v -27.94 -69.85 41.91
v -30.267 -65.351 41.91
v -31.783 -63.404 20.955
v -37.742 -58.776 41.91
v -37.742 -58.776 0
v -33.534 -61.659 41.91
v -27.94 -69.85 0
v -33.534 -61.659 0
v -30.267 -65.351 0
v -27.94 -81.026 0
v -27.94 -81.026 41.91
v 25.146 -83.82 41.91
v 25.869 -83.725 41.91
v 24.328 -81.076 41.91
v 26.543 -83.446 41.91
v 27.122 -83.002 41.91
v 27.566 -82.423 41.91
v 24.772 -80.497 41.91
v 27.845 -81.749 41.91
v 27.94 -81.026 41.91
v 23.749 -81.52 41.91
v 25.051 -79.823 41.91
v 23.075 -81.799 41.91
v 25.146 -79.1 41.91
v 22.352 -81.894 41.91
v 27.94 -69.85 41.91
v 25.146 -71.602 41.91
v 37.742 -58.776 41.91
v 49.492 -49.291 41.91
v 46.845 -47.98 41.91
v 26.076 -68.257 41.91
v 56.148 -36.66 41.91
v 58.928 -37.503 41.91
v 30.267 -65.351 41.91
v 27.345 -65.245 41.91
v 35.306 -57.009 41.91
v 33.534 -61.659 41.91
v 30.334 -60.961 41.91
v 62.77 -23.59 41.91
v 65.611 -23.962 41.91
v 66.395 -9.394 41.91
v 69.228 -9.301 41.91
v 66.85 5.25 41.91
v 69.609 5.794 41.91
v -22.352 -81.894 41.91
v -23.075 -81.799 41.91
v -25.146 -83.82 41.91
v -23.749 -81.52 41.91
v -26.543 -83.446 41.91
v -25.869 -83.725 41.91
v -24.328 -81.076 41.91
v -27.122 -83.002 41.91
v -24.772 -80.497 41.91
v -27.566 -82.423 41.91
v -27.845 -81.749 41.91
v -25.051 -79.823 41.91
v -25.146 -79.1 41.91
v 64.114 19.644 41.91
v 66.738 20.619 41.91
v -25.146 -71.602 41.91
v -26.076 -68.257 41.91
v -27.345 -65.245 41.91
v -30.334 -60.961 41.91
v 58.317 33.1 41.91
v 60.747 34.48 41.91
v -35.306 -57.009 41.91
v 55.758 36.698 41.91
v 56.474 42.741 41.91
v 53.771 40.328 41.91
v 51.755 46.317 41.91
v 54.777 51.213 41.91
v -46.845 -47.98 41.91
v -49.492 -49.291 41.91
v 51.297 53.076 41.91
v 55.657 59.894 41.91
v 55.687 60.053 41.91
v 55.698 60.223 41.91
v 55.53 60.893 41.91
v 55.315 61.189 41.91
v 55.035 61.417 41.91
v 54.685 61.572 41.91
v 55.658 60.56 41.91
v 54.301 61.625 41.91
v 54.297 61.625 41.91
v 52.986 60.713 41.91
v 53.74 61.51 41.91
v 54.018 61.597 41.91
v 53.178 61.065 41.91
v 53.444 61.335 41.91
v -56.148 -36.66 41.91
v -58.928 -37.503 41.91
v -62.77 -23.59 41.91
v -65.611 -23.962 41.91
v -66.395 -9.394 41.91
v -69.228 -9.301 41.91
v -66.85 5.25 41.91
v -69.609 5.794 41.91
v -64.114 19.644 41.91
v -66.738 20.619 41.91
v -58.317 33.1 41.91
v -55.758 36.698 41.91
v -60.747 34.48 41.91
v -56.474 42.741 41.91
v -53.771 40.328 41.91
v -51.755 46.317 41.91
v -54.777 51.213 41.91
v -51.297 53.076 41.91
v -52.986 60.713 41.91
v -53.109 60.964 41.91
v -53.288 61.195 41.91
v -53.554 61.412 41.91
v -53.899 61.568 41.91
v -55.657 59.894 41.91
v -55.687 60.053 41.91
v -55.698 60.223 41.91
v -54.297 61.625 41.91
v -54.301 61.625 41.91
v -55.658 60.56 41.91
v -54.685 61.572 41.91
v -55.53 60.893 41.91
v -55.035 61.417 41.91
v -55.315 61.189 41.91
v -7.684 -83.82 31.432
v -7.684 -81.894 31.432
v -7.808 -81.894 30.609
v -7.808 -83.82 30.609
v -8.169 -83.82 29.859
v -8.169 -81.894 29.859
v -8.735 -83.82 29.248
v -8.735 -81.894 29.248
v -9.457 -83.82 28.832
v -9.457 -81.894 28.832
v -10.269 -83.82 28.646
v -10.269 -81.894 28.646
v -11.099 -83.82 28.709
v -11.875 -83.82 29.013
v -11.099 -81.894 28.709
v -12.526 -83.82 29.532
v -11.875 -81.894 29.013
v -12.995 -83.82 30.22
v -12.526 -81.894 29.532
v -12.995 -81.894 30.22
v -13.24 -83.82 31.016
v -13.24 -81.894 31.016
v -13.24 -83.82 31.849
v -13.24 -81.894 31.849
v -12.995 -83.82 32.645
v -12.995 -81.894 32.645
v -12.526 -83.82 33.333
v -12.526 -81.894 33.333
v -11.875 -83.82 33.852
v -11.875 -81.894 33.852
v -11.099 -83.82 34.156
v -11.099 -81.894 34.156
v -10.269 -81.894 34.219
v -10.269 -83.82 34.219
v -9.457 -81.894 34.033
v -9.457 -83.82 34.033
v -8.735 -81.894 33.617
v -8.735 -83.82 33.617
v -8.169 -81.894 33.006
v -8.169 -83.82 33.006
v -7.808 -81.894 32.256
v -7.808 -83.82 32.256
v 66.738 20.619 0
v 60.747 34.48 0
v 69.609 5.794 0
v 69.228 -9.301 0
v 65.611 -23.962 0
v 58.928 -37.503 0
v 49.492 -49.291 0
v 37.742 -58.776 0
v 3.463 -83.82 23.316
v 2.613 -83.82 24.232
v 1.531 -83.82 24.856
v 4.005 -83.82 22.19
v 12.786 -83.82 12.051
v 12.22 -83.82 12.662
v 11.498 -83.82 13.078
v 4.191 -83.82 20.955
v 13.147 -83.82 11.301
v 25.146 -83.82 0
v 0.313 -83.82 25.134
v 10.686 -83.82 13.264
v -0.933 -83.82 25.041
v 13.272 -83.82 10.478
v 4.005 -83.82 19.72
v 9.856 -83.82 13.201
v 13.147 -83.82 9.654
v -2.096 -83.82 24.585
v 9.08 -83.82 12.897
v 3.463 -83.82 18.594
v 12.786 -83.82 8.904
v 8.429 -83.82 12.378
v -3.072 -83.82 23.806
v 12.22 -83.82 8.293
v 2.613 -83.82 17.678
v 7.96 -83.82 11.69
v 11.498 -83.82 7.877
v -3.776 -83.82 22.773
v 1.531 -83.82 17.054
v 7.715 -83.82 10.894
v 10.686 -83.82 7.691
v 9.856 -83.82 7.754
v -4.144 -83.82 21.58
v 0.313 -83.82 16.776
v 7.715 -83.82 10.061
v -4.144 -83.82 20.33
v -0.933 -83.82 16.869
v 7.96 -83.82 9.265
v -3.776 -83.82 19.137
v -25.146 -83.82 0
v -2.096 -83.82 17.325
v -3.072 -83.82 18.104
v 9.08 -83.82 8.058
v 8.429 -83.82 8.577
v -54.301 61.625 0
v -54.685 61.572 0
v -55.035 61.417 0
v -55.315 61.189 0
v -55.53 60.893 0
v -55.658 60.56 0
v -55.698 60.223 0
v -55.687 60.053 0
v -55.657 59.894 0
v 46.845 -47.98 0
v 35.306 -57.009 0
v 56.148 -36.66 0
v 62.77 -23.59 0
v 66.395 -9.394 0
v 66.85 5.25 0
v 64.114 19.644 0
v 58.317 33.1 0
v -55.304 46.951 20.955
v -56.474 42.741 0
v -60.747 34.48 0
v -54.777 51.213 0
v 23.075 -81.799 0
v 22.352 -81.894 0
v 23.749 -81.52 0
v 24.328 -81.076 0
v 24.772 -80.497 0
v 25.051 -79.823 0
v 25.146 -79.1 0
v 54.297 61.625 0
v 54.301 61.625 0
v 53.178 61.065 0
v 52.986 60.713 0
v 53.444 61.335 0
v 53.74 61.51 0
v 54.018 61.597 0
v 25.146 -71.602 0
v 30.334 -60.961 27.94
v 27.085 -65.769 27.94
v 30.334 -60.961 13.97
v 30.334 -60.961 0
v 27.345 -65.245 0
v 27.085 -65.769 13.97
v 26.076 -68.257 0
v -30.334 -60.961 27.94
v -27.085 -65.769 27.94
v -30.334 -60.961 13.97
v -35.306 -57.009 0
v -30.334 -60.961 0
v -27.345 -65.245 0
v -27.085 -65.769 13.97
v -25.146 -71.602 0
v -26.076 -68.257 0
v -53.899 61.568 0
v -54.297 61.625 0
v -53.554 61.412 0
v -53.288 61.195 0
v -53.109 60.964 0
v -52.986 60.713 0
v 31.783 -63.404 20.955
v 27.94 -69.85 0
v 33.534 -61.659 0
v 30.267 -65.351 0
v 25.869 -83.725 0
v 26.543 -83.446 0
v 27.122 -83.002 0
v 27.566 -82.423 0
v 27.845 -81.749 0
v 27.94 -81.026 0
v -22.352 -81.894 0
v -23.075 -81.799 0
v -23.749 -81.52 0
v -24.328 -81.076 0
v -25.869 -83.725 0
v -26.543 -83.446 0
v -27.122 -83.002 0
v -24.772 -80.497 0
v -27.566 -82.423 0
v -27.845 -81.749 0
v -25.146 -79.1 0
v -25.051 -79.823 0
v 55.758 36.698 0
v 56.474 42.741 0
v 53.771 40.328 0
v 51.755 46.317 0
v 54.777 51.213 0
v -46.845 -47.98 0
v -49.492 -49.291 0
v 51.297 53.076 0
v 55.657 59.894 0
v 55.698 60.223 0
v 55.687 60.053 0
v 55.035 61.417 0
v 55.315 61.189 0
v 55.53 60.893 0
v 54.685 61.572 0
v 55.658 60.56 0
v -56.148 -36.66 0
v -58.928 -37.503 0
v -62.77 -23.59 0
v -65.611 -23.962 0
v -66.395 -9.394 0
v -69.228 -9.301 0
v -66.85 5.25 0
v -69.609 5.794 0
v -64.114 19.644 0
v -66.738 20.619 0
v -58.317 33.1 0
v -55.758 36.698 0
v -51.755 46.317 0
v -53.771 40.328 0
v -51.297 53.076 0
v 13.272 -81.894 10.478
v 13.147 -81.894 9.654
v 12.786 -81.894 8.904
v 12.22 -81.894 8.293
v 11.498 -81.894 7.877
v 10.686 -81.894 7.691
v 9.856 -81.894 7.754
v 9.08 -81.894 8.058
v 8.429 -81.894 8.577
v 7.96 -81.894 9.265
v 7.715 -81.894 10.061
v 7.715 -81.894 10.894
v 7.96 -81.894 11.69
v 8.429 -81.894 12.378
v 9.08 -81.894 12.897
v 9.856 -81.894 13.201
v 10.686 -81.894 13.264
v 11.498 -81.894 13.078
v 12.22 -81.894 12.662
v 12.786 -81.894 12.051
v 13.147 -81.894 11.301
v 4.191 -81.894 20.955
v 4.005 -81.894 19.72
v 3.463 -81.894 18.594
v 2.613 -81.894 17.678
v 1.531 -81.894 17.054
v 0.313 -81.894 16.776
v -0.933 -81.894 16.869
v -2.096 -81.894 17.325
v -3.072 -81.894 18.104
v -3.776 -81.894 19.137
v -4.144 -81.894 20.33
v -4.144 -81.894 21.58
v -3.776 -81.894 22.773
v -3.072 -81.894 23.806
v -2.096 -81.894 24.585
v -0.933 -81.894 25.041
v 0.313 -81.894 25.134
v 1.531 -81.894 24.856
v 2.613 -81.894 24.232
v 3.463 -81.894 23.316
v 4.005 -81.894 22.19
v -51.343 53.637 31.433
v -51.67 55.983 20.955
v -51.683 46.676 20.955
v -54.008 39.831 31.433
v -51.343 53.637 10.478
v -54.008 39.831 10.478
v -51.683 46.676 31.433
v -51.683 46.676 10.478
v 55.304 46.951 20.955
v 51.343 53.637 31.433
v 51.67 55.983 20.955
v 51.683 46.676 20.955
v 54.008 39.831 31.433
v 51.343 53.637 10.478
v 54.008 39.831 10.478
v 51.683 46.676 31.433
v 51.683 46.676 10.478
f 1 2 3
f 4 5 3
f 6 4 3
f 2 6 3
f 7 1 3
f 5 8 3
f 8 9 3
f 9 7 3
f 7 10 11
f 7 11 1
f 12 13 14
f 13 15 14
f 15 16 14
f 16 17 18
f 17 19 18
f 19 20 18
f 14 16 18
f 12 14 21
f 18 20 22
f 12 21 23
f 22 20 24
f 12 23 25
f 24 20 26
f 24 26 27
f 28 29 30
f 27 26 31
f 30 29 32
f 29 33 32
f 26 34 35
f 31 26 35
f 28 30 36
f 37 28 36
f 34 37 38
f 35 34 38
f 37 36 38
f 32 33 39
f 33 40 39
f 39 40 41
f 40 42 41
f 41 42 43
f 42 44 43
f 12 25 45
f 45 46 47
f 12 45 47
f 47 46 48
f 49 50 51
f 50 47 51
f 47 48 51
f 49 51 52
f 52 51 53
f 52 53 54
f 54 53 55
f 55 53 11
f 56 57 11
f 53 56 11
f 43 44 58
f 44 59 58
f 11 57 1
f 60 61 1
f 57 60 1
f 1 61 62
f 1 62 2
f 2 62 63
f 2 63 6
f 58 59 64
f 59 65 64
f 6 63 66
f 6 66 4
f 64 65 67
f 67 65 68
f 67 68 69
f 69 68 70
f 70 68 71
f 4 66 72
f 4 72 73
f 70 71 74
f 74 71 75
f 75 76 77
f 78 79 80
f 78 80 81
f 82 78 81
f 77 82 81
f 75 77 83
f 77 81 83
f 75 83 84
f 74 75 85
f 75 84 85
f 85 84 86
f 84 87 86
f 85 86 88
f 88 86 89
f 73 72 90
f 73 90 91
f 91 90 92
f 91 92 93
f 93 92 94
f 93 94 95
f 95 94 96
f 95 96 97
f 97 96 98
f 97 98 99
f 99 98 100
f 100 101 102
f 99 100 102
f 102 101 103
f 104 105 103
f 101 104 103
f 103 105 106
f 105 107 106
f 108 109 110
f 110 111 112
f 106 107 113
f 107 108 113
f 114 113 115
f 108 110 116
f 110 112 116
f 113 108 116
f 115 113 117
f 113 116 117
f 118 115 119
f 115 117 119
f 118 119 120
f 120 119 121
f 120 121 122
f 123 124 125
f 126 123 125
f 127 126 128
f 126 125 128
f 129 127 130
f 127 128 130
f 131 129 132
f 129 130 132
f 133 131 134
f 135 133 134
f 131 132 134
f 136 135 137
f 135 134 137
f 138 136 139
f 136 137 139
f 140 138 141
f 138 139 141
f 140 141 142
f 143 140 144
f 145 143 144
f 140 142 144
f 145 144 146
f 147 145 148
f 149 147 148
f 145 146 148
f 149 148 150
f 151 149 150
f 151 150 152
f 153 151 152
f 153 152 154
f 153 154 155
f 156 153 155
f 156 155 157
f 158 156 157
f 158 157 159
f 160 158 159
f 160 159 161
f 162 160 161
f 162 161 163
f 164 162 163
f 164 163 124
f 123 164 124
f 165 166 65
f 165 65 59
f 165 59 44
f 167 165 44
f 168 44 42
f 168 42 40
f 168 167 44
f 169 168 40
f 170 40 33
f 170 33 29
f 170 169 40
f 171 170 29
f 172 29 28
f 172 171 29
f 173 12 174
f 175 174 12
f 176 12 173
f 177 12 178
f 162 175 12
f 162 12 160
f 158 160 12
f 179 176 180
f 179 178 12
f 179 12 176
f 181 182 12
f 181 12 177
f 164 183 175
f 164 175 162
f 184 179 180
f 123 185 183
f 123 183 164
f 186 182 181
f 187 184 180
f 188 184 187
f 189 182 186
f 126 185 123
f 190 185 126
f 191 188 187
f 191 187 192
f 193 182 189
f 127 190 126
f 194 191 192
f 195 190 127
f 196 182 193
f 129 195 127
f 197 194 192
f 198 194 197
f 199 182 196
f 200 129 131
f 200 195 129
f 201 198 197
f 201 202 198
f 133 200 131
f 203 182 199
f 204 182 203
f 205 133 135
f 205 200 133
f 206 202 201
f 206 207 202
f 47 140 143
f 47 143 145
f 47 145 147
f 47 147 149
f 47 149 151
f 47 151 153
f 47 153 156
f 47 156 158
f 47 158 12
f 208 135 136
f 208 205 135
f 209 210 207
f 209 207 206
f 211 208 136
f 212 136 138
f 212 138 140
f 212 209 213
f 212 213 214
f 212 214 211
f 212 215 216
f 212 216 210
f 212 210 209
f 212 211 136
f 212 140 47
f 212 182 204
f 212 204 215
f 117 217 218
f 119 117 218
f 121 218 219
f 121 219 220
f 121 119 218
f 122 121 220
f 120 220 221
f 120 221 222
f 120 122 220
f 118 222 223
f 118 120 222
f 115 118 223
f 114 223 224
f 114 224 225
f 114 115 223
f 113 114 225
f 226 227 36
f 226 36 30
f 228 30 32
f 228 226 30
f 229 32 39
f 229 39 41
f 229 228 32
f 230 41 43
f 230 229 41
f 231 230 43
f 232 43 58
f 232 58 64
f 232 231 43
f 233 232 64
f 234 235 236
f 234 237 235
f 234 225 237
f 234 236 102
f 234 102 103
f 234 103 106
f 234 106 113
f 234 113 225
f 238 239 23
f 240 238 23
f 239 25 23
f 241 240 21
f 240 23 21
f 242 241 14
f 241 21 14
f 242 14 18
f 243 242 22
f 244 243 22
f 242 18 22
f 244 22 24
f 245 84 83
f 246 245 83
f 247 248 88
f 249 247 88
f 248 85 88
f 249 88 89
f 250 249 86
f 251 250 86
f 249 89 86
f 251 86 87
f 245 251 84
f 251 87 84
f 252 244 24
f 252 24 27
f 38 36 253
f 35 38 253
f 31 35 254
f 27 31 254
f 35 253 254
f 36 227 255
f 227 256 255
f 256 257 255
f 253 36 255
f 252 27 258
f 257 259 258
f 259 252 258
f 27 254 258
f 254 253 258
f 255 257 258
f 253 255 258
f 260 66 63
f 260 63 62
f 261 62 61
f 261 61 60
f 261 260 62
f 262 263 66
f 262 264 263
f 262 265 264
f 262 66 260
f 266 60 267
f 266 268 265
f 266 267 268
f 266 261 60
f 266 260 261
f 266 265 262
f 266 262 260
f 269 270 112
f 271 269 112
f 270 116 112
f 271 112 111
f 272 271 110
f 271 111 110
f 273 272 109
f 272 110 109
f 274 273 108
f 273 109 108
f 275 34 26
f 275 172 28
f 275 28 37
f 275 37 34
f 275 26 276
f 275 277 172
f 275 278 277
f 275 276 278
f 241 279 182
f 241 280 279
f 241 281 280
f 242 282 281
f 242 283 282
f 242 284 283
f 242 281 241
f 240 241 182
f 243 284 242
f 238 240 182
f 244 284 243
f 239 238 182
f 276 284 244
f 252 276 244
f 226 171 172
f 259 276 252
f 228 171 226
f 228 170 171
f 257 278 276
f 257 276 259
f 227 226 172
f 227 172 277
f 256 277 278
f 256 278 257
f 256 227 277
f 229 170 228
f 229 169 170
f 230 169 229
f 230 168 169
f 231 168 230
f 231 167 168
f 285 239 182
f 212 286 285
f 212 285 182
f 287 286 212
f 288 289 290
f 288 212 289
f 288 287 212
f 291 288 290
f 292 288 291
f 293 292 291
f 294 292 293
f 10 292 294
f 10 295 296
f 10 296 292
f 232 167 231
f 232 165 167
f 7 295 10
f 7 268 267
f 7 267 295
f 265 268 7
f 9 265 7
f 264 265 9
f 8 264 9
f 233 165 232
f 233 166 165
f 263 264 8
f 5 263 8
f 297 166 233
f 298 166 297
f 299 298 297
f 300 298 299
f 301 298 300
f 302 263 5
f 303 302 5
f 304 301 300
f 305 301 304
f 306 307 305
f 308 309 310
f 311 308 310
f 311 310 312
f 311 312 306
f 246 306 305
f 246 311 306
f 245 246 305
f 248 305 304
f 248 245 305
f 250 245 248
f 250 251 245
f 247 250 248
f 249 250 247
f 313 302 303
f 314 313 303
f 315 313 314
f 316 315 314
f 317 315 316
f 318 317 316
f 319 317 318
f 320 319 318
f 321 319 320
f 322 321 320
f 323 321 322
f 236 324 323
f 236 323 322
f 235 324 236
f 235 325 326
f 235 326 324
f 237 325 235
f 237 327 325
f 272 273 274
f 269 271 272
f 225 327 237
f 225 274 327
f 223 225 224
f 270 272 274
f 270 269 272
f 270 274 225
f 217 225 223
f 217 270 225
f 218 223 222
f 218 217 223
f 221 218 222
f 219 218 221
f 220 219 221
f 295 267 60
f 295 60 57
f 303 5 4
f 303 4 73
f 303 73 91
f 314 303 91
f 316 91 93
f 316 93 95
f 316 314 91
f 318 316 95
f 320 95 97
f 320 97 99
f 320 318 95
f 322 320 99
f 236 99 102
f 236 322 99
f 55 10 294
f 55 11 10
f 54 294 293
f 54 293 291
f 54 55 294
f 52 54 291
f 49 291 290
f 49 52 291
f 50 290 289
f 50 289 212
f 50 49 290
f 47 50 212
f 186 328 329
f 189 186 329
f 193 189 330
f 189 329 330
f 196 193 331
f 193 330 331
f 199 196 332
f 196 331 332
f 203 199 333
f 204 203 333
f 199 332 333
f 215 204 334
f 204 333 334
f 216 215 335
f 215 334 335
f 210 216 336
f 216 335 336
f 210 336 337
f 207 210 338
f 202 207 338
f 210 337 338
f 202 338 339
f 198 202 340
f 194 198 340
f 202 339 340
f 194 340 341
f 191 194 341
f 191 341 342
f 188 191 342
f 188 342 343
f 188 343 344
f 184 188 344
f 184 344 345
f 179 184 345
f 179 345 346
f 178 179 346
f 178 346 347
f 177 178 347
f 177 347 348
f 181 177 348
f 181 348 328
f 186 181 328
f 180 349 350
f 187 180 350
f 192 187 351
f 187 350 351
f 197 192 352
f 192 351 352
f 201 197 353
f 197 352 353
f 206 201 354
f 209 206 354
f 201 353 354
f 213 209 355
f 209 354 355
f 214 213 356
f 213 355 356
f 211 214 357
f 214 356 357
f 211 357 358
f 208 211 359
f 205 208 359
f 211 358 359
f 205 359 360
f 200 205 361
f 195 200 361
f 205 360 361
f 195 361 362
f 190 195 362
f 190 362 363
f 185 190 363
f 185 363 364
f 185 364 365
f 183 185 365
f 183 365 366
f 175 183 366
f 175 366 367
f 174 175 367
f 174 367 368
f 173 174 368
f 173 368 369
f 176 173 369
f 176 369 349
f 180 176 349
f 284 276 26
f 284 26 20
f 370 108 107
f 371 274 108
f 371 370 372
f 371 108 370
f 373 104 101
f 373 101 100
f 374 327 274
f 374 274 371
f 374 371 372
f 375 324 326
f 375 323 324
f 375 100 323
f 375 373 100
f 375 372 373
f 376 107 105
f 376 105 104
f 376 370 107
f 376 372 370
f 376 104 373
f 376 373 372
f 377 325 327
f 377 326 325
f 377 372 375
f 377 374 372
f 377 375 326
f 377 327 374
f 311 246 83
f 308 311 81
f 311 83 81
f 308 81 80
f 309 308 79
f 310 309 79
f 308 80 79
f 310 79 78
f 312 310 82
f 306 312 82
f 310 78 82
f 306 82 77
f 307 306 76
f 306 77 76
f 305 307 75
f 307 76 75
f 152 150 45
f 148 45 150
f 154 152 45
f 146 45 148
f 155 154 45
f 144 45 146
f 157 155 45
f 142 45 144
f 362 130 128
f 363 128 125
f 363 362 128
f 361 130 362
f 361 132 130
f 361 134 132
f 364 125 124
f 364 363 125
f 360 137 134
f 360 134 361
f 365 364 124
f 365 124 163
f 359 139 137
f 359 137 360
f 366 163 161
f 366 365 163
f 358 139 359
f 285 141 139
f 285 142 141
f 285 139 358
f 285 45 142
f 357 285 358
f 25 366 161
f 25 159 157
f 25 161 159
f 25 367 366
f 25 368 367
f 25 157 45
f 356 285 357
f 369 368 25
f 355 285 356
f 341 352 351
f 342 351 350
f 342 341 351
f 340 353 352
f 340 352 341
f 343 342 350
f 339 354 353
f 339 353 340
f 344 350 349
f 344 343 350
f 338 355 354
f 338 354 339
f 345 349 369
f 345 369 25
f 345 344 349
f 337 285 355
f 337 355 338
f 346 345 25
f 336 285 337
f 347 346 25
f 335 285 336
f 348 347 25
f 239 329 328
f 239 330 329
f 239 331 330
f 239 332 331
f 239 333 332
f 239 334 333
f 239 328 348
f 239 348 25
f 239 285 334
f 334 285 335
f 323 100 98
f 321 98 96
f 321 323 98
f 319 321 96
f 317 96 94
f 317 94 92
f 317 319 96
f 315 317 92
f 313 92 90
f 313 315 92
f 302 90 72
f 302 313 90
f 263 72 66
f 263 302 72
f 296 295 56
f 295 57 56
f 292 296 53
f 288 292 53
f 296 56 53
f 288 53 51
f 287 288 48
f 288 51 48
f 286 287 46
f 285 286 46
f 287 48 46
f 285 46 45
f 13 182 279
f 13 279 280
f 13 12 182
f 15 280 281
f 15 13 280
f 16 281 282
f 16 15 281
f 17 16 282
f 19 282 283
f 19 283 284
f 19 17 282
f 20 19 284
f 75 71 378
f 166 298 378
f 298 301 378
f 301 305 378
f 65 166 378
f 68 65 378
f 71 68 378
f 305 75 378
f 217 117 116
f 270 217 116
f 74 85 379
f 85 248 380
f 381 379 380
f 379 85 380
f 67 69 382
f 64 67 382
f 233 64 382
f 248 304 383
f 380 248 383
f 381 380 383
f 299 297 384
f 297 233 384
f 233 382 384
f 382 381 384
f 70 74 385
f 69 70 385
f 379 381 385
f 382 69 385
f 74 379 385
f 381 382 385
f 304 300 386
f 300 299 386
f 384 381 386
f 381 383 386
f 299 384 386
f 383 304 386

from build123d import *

# Parameters (mm, degrees)
BOSS_EXTRUDE1_DEPTH = 38.1
SKETCH2_R           = 3.81
SKETCH2_R_2         = 2.54
CUT_EXTRUDE1_DEPTH  = 2.54
FILLET1_R           = 1.27
FILLET2_R           = 2.54
SCALE1_SCALE        = 1.1


with BuildPart() as part:
    # Sketch1 → Boss-Extrude1 (new body)
    with BuildSketch(Plane.XY):
        with BuildLine():
            Line((-51.030503122, 56.023178588), (-48.490503122, 56.023178588))
            add(Edge.make_bspline(
                [(-48.490503122, 56.023178588), (-43.069252532, 42.611394773), (-53.01543557, 30.091280986)],
                knots=[0, 0, 0, 1, 1, 1], degree=2))
            ThreePointArc((-53.01543557, 30.091280986), (-59.06455096, -15.083117047), (-32.096486043, -51.826028053))
            add(Edge.make_bspline(
                [(-32.096486043, -51.826028053), (-26.666596777, -55.080730316), (-24.15411201, -59.274056829), (-22.86, -65.092330549)],
                knots=[0, 0, 0, 0, 1, 1, 1, 1], degree=3))
            Line((-22.86, -65.092330549), (-22.86, -74.449178354))
            Line((-22.86, -74.449178354), (22.86, -74.449178354))
            Line((22.86, -74.449178354), (22.86, -65.092330549))
            add(Edge.make_bspline(
                [(32.096486043, -51.826028053), (26.666596777, -55.080730316), (24.15411201, -59.274056829), (22.86, -65.092330549)],
                knots=[0, 0, 0, 0, 1, 1, 1, 1], degree=3))
            ThreePointArc((32.096486043, -51.826028053), (59.06455096, -15.083117047), (53.01543557, 30.091280986))
            add(Edge.make_bspline(
                [(48.490503122, 56.023178588), (43.069252532, 42.611394773), (53.01543557, 30.091280986)],
                knots=[0, 0, 0, 1, 1, 1], degree=2))
            Line((48.490503122, 56.023178588), (51.030503122, 56.023178588))
            add(Edge.make_bspline(
                [(55.224412052, 31.34508436), (47.144066751, 43.196956405), (51.030503122, 56.023178588)],
                knots=[0, 0, 0, 1, 1, 1], degree=2))
            ThreePointArc((55.224412052, 31.34508436), (61.651768505, -15.208860583), (34.310656711, -53.432469867))
            add(Edge.make_bspline(
                [(34.310656711, -53.432469867), (27.932475889, -56.813983763), (25.4, -63.5)],
                knots=[0, 0, 0, 1, 1, 1], degree=2))
            Line((25.4, -63.5), (25.4, -76.2))
            Line((25.4, -76.2), (-25.4, -76.2))
            Line((-25.4, -76.2), (-25.4, -63.5))
            add(Edge.make_bspline(
                [(-34.310656711, -53.432469867), (-27.932475889, -56.813983763), (-25.4, -63.5)],
                knots=[0, 0, 0, 1, 1, 1], degree=2))
            ThreePointArc((-34.310656711, -53.432469867), (-61.651768505, -15.208860583), (-55.224412052, 31.34508436))
            add(Edge.make_bspline(
                [(-55.224412052, 31.34508436), (-47.144066751, 43.196956405), (-51.030503122, 56.023178588)],
                knots=[0, 0, 0, 1, 1, 1], degree=2))
        make_face()
    extrude(amount=BOSS_EXTRUDE1_DEPTH)

    # Sketch2 → Cut-Extrude1 (cut)
    with BuildSketch(Plane(origin=(0, -74.449178354, 0), x_dir=(1, 0, 0), z_dir=(0, 1, 0))):
        with Locations((0, -19.05)):
            Circle(SKETCH2_R)
        with Locations((9.525, -9.525)):
            Circle(SKETCH2_R_2)
        with Locations((-9.525, -28.575)):
            Circle(SKETCH2_R_2)
    extrude(amount=-CUT_EXTRUDE1_DEPTH, mode=Mode.SUBTRACT)

    # Fillet1
    fillet1_edges = [part.edges().sort_by_distance(p)[0] for p in [
        (51.030503122, 56.023178588, 19.05),
        (48.490503122, 56.023178588, 19.05),
        (-48.490503122, 56.023178588, 19.05),
        (-51.030503122, 56.023178588, 19.05),
    ]]
    fillet(fillet1_edges, radius=FILLET1_R)

    # Fillet2
    fillet2_edges = [part.edges().sort_by_distance(p)[0] for p in [
        (-22.86, -74.449178354, 19.05),
        (22.86, -74.449178354, 19.05),
        (25.4, -76.2, 19.05),
        (-25.4, -76.2, 19.05),
    ]]
    fillet(fillet2_edges, radius=FILLET2_R)


with BuildPart() as part_1:
    # Scale1: scaled about (0, 0, 0)
    add(part.part.scale(SCALE1_SCALE))


solid = part_1.part
